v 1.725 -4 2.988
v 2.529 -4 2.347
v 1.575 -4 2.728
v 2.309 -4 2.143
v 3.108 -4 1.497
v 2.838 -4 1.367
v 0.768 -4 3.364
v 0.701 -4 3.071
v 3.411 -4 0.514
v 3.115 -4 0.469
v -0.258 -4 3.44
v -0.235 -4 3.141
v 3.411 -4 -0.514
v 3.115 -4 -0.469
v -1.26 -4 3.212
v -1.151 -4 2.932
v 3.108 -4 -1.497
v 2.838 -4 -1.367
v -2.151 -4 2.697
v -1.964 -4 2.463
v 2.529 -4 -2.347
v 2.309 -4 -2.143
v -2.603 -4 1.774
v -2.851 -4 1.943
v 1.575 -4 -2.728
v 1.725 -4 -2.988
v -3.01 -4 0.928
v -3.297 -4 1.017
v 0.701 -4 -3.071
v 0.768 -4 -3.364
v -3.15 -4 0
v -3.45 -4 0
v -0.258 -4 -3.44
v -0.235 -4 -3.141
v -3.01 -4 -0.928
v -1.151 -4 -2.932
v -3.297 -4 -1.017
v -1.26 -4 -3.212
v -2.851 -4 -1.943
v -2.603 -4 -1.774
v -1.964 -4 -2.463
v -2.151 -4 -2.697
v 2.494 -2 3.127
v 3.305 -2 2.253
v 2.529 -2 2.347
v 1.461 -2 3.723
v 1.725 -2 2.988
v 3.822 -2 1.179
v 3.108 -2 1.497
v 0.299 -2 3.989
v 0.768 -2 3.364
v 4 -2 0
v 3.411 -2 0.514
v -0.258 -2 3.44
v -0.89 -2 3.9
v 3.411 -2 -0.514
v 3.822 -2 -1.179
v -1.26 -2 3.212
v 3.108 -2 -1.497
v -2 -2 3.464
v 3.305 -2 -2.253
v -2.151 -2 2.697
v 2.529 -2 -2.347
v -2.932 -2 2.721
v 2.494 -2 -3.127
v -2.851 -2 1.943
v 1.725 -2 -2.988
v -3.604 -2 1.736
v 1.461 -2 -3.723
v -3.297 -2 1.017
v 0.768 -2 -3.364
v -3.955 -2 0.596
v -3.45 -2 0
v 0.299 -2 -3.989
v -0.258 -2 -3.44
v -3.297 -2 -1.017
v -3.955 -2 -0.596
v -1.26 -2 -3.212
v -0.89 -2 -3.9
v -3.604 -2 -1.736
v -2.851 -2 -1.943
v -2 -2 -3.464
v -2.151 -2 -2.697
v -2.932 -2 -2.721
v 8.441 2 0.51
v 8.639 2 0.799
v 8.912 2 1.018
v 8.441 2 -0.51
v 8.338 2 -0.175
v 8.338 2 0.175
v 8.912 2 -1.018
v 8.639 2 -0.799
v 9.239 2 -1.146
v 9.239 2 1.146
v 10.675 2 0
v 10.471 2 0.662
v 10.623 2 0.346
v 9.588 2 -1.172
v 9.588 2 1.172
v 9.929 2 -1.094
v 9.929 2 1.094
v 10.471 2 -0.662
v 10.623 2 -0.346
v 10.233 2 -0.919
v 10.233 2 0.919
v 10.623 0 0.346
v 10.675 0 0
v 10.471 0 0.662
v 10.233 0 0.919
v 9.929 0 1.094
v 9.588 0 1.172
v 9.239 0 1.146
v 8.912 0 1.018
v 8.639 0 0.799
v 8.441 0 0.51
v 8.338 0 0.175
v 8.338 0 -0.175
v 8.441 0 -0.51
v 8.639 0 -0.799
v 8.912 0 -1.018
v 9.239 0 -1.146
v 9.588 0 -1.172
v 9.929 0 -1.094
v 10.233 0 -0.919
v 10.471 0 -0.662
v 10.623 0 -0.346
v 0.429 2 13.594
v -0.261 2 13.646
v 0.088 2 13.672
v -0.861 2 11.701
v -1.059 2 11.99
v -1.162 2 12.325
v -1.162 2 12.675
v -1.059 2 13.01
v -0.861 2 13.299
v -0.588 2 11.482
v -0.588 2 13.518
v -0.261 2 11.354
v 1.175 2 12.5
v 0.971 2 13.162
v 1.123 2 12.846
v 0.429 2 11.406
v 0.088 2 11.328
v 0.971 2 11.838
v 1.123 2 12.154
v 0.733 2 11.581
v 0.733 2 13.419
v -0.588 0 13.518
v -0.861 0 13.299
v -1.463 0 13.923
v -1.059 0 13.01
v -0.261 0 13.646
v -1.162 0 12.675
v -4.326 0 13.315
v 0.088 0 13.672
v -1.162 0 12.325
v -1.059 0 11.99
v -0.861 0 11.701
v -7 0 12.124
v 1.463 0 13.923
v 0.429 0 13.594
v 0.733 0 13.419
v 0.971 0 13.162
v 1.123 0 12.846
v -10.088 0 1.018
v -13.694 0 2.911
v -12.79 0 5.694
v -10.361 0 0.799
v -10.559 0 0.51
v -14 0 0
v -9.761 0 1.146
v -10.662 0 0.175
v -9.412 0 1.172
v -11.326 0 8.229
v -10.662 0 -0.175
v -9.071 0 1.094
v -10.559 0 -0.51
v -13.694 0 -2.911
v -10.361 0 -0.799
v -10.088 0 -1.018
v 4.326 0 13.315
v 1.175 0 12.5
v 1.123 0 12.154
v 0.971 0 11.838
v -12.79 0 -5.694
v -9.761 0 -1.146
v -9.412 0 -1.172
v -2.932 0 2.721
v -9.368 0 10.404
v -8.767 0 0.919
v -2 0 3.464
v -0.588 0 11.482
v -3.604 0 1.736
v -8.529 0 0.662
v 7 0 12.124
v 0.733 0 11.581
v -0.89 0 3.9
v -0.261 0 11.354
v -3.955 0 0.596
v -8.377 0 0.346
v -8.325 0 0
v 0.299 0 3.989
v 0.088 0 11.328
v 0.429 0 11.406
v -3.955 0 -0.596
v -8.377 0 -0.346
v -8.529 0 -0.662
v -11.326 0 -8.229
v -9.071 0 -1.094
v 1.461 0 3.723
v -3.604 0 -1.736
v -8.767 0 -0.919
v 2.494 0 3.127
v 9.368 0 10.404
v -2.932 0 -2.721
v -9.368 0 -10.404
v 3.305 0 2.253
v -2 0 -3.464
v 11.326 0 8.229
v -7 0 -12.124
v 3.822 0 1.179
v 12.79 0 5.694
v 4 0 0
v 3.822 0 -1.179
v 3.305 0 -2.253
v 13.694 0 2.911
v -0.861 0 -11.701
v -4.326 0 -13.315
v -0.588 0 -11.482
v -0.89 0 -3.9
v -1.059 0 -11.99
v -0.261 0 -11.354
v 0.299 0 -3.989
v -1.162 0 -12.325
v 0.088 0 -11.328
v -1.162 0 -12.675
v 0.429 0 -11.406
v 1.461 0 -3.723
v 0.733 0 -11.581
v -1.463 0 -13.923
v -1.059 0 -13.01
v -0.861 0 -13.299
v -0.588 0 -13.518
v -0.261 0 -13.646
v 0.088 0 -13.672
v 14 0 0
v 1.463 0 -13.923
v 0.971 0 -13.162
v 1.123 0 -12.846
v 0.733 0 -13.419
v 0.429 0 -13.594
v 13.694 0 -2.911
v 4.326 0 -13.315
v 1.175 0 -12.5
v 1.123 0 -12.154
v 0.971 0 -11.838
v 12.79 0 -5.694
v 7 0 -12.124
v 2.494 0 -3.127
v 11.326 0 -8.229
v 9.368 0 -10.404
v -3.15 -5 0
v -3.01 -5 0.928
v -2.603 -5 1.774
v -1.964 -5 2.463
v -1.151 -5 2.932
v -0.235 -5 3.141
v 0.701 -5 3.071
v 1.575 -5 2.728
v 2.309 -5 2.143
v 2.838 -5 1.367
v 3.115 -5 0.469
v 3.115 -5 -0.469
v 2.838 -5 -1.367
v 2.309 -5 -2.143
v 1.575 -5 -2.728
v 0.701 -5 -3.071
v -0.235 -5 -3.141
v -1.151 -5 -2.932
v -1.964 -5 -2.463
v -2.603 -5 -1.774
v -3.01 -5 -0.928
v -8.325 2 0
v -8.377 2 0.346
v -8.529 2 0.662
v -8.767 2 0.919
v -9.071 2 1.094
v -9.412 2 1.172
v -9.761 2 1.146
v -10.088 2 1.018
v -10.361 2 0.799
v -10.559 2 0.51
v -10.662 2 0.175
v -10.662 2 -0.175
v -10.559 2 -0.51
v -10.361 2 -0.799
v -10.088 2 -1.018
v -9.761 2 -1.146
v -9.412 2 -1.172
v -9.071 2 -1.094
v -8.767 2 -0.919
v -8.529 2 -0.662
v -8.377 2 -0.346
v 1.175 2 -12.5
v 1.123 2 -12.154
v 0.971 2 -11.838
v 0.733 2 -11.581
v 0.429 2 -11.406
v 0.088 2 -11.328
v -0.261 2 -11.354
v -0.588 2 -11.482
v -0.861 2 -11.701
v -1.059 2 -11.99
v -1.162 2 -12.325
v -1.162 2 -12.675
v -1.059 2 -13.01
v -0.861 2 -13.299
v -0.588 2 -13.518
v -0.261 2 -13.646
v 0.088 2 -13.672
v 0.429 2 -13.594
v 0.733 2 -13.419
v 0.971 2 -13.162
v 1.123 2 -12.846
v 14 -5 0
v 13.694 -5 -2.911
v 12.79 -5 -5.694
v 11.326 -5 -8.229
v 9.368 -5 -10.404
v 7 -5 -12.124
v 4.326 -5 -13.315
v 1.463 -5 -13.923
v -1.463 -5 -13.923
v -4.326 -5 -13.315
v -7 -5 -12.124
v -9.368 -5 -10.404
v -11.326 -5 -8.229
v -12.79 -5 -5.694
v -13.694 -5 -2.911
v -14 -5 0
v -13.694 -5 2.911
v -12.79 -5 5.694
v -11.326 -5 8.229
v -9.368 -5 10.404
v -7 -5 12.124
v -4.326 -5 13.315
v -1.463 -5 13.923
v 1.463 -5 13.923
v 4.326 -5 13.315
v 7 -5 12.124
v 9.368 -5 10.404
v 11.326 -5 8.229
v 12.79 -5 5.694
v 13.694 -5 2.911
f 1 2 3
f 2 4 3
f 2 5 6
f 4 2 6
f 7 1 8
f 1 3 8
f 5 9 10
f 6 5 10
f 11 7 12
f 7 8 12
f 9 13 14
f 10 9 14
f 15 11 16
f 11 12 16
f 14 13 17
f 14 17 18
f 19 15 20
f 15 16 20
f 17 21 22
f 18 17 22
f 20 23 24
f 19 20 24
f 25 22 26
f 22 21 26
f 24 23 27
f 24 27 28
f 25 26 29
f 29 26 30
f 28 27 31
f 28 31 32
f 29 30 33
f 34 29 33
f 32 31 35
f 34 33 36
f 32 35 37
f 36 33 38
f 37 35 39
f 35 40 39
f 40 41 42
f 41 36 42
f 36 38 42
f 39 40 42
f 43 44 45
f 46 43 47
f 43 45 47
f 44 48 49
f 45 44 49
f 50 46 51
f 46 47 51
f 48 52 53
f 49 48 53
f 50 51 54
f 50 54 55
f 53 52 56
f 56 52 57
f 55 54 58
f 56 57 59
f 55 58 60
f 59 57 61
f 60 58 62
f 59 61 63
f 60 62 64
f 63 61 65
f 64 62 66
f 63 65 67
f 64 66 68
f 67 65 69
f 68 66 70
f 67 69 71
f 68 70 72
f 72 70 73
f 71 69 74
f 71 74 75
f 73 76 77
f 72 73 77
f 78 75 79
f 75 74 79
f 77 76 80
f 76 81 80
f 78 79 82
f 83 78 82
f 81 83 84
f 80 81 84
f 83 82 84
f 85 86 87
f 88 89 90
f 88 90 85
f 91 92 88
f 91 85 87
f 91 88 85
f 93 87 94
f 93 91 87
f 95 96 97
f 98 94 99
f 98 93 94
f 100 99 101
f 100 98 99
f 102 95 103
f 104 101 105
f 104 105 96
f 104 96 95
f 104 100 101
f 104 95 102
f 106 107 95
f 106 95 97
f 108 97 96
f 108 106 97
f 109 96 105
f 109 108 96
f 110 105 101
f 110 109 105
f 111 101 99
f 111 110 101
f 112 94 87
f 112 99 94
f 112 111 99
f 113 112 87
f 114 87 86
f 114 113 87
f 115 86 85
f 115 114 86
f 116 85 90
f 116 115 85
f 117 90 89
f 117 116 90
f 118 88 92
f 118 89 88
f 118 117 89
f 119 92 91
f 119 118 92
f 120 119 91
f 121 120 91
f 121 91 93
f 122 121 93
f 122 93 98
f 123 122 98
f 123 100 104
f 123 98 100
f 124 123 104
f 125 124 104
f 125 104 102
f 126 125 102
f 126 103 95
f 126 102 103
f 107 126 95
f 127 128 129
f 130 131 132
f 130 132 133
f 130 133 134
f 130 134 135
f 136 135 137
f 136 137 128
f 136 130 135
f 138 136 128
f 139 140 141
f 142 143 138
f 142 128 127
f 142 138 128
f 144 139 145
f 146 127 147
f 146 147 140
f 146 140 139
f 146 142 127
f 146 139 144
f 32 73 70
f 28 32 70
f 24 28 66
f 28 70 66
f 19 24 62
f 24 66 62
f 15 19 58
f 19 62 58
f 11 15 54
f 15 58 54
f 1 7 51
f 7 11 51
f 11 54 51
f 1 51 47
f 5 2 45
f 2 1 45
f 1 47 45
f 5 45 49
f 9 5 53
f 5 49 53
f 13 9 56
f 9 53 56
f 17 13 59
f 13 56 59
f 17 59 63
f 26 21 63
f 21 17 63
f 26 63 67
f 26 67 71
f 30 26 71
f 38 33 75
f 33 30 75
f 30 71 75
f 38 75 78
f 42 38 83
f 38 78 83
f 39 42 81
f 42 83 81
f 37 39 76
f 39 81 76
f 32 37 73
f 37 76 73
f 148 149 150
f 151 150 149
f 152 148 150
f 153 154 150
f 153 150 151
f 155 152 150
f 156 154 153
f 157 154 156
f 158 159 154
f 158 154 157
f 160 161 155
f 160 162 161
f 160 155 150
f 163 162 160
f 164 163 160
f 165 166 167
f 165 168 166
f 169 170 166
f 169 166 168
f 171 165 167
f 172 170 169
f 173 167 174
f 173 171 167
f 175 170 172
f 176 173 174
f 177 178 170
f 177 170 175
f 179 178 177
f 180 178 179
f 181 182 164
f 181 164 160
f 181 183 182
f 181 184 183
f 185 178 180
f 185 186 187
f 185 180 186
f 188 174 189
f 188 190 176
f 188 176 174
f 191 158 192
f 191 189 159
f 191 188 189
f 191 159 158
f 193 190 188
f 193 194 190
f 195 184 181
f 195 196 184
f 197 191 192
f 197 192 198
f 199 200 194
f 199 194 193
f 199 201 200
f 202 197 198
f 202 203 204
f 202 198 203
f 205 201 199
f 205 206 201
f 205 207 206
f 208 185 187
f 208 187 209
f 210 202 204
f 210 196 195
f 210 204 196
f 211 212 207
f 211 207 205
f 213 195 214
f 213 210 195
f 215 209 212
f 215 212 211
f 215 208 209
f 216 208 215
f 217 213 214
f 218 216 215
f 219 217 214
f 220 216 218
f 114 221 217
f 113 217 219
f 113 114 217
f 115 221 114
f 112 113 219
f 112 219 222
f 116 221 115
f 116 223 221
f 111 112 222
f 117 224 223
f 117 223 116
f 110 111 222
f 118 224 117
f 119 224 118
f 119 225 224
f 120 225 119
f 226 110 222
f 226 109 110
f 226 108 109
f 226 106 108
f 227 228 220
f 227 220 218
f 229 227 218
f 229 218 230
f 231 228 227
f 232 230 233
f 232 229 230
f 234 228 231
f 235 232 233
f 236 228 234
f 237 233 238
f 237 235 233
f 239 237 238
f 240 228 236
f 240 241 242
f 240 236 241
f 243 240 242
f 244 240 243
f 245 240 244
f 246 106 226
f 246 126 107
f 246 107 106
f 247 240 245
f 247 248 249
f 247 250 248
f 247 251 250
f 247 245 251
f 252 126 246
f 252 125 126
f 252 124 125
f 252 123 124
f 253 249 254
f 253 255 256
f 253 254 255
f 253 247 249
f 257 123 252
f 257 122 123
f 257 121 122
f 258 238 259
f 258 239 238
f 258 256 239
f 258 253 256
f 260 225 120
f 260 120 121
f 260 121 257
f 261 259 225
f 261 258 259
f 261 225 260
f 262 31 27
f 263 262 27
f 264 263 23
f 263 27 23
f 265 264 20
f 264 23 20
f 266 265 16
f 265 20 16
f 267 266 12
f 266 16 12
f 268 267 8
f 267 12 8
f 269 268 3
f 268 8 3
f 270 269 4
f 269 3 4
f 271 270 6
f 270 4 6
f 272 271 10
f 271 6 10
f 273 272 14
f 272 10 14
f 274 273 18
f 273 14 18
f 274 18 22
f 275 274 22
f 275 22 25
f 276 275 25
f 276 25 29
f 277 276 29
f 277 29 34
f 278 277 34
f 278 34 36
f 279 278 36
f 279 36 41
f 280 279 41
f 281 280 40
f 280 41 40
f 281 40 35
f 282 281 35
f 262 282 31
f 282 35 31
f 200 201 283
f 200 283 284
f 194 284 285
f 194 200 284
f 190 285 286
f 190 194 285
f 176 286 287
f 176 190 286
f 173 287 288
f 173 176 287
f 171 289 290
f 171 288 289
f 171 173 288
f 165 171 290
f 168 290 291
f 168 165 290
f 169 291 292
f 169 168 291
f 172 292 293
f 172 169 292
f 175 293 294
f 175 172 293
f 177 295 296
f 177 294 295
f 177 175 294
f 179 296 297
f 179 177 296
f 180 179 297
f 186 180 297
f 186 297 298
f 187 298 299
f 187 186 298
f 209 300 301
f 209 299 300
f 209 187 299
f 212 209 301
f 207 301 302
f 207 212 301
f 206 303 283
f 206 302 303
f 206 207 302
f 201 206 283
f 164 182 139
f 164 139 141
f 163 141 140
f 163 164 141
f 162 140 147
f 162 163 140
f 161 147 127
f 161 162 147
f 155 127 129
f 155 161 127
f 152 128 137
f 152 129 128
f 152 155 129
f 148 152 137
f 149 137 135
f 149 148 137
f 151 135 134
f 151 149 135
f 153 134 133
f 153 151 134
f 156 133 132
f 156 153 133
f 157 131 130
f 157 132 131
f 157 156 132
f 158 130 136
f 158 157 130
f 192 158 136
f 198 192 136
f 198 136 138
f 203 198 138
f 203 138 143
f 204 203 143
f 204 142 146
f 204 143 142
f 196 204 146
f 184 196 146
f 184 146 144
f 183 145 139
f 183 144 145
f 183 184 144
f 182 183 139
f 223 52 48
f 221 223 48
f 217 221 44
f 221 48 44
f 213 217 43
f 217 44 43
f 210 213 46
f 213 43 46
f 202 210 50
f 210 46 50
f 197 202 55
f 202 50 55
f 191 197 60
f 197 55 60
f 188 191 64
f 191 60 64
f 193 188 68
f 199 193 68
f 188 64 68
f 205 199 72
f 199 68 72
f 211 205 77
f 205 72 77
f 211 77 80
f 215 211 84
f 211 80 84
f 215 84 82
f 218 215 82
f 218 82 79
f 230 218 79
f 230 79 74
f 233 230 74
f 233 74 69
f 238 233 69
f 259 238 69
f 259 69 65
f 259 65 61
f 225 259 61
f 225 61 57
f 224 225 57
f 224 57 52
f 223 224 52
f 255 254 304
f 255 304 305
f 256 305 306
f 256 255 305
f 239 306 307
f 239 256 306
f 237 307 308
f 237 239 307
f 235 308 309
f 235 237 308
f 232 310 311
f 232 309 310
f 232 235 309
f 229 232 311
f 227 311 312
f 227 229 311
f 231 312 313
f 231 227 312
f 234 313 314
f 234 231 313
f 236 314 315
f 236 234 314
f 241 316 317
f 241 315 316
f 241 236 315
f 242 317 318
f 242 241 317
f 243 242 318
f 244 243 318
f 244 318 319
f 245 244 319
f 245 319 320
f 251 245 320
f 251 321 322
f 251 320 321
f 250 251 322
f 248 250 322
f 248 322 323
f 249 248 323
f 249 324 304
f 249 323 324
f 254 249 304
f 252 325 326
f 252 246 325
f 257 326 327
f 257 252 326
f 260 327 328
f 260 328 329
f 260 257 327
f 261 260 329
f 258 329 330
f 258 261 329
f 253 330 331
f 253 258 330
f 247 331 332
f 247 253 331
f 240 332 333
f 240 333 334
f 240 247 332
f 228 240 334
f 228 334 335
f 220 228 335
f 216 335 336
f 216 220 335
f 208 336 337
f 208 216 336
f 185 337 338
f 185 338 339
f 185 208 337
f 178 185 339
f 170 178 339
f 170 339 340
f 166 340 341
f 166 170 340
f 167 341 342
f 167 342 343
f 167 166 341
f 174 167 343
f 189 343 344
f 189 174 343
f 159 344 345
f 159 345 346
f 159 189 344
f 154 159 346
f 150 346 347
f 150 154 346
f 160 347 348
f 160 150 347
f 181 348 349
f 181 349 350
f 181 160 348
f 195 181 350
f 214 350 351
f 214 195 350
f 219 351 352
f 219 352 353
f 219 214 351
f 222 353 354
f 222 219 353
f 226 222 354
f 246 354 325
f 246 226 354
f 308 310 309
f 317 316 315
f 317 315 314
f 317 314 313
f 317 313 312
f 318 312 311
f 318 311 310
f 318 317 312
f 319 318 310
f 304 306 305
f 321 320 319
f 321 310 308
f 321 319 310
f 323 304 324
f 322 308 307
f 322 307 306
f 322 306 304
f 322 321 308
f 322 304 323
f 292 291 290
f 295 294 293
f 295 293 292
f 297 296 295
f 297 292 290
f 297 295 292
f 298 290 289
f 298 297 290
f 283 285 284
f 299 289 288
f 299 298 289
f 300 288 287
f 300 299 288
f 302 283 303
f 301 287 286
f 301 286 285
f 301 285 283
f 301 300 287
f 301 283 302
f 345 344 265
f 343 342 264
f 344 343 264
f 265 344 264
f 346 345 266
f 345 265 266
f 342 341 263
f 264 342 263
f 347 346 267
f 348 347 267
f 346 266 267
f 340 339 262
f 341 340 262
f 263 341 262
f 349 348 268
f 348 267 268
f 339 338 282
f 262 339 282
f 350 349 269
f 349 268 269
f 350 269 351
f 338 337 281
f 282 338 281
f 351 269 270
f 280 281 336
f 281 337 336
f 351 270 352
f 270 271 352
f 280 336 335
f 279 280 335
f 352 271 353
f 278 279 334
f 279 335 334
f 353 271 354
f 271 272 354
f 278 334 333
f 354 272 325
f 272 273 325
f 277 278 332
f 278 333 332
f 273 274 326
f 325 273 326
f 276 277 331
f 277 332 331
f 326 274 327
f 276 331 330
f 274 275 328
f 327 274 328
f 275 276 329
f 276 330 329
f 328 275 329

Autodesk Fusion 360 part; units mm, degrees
sketch "スケッチ1" plane through (0, 0, 0) normal (0, 1, 0) x (1, 0, 0)
  circle A0 centre (0, 0) radius 14
  circle A1 centre (0, 0) radius 9.5 construction
  line L0 (-9.5, 0) -> (9.5, 0) construction
  circle A2 centre (-9.5, 0) radius 1.175
  circle A3 centre (9.5, 0) radius 1.175
  circle A4 centre (0, 0) radius 12.5 construction
  line L1 (0, 12.5) -> (0, -12.5) construction
  circle A5 centre (0, 12.5) radius 1.175
  circle A6 centre (0, -12.5) radius 1.175
  dimension "d1" = 28
  dimension "d2" = 19
  dimension "d3" = 2.35
  dimension "d4" = 2.35
  dimension "d5" = 25
  dimension "d6" = 2.35
  dimension "d7" = 2.35
extrude "押し出し1" add sketch "スケッチ1" along normal blind 2 contours A2 | A3 | A5 | A6 makes body 1 at (-8.3265, 1.3333, 0.0586) makes body 2 at (10.6735, 1.3333, 0.0586) makes body 3 at (1.1735, 1.3333, -12.4414) makes body 4 at (1.1735, 1.3333, 12.5586)
extrude "押し出し2" add sketch "スケッチ1" against normal blind 4 contours A0 | A2 | A3 | A5 | A6 bodies 1 2 3 4
sketch "スケッチ2" plane through (0, -4, 0) normal (0, -1, 0) x (1, 0, 0)
  circle A0 centre (0, 0) radius 14
  circle A1 centre (0, 0) radius 4
  dimension "d12" = 8
extrude "押し出し3" cut sketch "スケッチ2" against normal blind 4 contours A1 bodies 1
ref_plane "作業平面1" through (0, -2, 0) normal (0, -1, 0) x (-1, 0, 0)
sketch "スケッチ3" plane through (0, -2, 0) normal (0, -1, 0) x (-1, 0, 0)
  circle A0 centre (0, 0) radius 4
  circle A1 centre (0, 0) radius 3.45
  dimension "d16" = 8
  dimension "d17" = 6.9
extrude "押し出し4" add sketch "スケッチ3" along normal blind 3 bodies 1
ref_plane "作業平面3" through (0, -4, 0) normal (0, -1, 0) x (-1, 0, 0)
sketch "スケッチ5" plane through (0, -4, 0) normal (0, -1, 0) x (-1, 0, 0)
  circle A0 centre (0, 0) radius 3.45
  circle A1 centre (0, 0) radius 3.15
  dimension "d26" = 6.9
  dimension "d27" = 6.3
extrude "押し出し6" add sketch "スケッチ5" along normal blind 1 bodies 1
extrude "押し出し7" add 1 faces at (10.6145, -4, 0.6955) along direction (0, -1, 0) blind 1 on bodies 1 bodies 1
